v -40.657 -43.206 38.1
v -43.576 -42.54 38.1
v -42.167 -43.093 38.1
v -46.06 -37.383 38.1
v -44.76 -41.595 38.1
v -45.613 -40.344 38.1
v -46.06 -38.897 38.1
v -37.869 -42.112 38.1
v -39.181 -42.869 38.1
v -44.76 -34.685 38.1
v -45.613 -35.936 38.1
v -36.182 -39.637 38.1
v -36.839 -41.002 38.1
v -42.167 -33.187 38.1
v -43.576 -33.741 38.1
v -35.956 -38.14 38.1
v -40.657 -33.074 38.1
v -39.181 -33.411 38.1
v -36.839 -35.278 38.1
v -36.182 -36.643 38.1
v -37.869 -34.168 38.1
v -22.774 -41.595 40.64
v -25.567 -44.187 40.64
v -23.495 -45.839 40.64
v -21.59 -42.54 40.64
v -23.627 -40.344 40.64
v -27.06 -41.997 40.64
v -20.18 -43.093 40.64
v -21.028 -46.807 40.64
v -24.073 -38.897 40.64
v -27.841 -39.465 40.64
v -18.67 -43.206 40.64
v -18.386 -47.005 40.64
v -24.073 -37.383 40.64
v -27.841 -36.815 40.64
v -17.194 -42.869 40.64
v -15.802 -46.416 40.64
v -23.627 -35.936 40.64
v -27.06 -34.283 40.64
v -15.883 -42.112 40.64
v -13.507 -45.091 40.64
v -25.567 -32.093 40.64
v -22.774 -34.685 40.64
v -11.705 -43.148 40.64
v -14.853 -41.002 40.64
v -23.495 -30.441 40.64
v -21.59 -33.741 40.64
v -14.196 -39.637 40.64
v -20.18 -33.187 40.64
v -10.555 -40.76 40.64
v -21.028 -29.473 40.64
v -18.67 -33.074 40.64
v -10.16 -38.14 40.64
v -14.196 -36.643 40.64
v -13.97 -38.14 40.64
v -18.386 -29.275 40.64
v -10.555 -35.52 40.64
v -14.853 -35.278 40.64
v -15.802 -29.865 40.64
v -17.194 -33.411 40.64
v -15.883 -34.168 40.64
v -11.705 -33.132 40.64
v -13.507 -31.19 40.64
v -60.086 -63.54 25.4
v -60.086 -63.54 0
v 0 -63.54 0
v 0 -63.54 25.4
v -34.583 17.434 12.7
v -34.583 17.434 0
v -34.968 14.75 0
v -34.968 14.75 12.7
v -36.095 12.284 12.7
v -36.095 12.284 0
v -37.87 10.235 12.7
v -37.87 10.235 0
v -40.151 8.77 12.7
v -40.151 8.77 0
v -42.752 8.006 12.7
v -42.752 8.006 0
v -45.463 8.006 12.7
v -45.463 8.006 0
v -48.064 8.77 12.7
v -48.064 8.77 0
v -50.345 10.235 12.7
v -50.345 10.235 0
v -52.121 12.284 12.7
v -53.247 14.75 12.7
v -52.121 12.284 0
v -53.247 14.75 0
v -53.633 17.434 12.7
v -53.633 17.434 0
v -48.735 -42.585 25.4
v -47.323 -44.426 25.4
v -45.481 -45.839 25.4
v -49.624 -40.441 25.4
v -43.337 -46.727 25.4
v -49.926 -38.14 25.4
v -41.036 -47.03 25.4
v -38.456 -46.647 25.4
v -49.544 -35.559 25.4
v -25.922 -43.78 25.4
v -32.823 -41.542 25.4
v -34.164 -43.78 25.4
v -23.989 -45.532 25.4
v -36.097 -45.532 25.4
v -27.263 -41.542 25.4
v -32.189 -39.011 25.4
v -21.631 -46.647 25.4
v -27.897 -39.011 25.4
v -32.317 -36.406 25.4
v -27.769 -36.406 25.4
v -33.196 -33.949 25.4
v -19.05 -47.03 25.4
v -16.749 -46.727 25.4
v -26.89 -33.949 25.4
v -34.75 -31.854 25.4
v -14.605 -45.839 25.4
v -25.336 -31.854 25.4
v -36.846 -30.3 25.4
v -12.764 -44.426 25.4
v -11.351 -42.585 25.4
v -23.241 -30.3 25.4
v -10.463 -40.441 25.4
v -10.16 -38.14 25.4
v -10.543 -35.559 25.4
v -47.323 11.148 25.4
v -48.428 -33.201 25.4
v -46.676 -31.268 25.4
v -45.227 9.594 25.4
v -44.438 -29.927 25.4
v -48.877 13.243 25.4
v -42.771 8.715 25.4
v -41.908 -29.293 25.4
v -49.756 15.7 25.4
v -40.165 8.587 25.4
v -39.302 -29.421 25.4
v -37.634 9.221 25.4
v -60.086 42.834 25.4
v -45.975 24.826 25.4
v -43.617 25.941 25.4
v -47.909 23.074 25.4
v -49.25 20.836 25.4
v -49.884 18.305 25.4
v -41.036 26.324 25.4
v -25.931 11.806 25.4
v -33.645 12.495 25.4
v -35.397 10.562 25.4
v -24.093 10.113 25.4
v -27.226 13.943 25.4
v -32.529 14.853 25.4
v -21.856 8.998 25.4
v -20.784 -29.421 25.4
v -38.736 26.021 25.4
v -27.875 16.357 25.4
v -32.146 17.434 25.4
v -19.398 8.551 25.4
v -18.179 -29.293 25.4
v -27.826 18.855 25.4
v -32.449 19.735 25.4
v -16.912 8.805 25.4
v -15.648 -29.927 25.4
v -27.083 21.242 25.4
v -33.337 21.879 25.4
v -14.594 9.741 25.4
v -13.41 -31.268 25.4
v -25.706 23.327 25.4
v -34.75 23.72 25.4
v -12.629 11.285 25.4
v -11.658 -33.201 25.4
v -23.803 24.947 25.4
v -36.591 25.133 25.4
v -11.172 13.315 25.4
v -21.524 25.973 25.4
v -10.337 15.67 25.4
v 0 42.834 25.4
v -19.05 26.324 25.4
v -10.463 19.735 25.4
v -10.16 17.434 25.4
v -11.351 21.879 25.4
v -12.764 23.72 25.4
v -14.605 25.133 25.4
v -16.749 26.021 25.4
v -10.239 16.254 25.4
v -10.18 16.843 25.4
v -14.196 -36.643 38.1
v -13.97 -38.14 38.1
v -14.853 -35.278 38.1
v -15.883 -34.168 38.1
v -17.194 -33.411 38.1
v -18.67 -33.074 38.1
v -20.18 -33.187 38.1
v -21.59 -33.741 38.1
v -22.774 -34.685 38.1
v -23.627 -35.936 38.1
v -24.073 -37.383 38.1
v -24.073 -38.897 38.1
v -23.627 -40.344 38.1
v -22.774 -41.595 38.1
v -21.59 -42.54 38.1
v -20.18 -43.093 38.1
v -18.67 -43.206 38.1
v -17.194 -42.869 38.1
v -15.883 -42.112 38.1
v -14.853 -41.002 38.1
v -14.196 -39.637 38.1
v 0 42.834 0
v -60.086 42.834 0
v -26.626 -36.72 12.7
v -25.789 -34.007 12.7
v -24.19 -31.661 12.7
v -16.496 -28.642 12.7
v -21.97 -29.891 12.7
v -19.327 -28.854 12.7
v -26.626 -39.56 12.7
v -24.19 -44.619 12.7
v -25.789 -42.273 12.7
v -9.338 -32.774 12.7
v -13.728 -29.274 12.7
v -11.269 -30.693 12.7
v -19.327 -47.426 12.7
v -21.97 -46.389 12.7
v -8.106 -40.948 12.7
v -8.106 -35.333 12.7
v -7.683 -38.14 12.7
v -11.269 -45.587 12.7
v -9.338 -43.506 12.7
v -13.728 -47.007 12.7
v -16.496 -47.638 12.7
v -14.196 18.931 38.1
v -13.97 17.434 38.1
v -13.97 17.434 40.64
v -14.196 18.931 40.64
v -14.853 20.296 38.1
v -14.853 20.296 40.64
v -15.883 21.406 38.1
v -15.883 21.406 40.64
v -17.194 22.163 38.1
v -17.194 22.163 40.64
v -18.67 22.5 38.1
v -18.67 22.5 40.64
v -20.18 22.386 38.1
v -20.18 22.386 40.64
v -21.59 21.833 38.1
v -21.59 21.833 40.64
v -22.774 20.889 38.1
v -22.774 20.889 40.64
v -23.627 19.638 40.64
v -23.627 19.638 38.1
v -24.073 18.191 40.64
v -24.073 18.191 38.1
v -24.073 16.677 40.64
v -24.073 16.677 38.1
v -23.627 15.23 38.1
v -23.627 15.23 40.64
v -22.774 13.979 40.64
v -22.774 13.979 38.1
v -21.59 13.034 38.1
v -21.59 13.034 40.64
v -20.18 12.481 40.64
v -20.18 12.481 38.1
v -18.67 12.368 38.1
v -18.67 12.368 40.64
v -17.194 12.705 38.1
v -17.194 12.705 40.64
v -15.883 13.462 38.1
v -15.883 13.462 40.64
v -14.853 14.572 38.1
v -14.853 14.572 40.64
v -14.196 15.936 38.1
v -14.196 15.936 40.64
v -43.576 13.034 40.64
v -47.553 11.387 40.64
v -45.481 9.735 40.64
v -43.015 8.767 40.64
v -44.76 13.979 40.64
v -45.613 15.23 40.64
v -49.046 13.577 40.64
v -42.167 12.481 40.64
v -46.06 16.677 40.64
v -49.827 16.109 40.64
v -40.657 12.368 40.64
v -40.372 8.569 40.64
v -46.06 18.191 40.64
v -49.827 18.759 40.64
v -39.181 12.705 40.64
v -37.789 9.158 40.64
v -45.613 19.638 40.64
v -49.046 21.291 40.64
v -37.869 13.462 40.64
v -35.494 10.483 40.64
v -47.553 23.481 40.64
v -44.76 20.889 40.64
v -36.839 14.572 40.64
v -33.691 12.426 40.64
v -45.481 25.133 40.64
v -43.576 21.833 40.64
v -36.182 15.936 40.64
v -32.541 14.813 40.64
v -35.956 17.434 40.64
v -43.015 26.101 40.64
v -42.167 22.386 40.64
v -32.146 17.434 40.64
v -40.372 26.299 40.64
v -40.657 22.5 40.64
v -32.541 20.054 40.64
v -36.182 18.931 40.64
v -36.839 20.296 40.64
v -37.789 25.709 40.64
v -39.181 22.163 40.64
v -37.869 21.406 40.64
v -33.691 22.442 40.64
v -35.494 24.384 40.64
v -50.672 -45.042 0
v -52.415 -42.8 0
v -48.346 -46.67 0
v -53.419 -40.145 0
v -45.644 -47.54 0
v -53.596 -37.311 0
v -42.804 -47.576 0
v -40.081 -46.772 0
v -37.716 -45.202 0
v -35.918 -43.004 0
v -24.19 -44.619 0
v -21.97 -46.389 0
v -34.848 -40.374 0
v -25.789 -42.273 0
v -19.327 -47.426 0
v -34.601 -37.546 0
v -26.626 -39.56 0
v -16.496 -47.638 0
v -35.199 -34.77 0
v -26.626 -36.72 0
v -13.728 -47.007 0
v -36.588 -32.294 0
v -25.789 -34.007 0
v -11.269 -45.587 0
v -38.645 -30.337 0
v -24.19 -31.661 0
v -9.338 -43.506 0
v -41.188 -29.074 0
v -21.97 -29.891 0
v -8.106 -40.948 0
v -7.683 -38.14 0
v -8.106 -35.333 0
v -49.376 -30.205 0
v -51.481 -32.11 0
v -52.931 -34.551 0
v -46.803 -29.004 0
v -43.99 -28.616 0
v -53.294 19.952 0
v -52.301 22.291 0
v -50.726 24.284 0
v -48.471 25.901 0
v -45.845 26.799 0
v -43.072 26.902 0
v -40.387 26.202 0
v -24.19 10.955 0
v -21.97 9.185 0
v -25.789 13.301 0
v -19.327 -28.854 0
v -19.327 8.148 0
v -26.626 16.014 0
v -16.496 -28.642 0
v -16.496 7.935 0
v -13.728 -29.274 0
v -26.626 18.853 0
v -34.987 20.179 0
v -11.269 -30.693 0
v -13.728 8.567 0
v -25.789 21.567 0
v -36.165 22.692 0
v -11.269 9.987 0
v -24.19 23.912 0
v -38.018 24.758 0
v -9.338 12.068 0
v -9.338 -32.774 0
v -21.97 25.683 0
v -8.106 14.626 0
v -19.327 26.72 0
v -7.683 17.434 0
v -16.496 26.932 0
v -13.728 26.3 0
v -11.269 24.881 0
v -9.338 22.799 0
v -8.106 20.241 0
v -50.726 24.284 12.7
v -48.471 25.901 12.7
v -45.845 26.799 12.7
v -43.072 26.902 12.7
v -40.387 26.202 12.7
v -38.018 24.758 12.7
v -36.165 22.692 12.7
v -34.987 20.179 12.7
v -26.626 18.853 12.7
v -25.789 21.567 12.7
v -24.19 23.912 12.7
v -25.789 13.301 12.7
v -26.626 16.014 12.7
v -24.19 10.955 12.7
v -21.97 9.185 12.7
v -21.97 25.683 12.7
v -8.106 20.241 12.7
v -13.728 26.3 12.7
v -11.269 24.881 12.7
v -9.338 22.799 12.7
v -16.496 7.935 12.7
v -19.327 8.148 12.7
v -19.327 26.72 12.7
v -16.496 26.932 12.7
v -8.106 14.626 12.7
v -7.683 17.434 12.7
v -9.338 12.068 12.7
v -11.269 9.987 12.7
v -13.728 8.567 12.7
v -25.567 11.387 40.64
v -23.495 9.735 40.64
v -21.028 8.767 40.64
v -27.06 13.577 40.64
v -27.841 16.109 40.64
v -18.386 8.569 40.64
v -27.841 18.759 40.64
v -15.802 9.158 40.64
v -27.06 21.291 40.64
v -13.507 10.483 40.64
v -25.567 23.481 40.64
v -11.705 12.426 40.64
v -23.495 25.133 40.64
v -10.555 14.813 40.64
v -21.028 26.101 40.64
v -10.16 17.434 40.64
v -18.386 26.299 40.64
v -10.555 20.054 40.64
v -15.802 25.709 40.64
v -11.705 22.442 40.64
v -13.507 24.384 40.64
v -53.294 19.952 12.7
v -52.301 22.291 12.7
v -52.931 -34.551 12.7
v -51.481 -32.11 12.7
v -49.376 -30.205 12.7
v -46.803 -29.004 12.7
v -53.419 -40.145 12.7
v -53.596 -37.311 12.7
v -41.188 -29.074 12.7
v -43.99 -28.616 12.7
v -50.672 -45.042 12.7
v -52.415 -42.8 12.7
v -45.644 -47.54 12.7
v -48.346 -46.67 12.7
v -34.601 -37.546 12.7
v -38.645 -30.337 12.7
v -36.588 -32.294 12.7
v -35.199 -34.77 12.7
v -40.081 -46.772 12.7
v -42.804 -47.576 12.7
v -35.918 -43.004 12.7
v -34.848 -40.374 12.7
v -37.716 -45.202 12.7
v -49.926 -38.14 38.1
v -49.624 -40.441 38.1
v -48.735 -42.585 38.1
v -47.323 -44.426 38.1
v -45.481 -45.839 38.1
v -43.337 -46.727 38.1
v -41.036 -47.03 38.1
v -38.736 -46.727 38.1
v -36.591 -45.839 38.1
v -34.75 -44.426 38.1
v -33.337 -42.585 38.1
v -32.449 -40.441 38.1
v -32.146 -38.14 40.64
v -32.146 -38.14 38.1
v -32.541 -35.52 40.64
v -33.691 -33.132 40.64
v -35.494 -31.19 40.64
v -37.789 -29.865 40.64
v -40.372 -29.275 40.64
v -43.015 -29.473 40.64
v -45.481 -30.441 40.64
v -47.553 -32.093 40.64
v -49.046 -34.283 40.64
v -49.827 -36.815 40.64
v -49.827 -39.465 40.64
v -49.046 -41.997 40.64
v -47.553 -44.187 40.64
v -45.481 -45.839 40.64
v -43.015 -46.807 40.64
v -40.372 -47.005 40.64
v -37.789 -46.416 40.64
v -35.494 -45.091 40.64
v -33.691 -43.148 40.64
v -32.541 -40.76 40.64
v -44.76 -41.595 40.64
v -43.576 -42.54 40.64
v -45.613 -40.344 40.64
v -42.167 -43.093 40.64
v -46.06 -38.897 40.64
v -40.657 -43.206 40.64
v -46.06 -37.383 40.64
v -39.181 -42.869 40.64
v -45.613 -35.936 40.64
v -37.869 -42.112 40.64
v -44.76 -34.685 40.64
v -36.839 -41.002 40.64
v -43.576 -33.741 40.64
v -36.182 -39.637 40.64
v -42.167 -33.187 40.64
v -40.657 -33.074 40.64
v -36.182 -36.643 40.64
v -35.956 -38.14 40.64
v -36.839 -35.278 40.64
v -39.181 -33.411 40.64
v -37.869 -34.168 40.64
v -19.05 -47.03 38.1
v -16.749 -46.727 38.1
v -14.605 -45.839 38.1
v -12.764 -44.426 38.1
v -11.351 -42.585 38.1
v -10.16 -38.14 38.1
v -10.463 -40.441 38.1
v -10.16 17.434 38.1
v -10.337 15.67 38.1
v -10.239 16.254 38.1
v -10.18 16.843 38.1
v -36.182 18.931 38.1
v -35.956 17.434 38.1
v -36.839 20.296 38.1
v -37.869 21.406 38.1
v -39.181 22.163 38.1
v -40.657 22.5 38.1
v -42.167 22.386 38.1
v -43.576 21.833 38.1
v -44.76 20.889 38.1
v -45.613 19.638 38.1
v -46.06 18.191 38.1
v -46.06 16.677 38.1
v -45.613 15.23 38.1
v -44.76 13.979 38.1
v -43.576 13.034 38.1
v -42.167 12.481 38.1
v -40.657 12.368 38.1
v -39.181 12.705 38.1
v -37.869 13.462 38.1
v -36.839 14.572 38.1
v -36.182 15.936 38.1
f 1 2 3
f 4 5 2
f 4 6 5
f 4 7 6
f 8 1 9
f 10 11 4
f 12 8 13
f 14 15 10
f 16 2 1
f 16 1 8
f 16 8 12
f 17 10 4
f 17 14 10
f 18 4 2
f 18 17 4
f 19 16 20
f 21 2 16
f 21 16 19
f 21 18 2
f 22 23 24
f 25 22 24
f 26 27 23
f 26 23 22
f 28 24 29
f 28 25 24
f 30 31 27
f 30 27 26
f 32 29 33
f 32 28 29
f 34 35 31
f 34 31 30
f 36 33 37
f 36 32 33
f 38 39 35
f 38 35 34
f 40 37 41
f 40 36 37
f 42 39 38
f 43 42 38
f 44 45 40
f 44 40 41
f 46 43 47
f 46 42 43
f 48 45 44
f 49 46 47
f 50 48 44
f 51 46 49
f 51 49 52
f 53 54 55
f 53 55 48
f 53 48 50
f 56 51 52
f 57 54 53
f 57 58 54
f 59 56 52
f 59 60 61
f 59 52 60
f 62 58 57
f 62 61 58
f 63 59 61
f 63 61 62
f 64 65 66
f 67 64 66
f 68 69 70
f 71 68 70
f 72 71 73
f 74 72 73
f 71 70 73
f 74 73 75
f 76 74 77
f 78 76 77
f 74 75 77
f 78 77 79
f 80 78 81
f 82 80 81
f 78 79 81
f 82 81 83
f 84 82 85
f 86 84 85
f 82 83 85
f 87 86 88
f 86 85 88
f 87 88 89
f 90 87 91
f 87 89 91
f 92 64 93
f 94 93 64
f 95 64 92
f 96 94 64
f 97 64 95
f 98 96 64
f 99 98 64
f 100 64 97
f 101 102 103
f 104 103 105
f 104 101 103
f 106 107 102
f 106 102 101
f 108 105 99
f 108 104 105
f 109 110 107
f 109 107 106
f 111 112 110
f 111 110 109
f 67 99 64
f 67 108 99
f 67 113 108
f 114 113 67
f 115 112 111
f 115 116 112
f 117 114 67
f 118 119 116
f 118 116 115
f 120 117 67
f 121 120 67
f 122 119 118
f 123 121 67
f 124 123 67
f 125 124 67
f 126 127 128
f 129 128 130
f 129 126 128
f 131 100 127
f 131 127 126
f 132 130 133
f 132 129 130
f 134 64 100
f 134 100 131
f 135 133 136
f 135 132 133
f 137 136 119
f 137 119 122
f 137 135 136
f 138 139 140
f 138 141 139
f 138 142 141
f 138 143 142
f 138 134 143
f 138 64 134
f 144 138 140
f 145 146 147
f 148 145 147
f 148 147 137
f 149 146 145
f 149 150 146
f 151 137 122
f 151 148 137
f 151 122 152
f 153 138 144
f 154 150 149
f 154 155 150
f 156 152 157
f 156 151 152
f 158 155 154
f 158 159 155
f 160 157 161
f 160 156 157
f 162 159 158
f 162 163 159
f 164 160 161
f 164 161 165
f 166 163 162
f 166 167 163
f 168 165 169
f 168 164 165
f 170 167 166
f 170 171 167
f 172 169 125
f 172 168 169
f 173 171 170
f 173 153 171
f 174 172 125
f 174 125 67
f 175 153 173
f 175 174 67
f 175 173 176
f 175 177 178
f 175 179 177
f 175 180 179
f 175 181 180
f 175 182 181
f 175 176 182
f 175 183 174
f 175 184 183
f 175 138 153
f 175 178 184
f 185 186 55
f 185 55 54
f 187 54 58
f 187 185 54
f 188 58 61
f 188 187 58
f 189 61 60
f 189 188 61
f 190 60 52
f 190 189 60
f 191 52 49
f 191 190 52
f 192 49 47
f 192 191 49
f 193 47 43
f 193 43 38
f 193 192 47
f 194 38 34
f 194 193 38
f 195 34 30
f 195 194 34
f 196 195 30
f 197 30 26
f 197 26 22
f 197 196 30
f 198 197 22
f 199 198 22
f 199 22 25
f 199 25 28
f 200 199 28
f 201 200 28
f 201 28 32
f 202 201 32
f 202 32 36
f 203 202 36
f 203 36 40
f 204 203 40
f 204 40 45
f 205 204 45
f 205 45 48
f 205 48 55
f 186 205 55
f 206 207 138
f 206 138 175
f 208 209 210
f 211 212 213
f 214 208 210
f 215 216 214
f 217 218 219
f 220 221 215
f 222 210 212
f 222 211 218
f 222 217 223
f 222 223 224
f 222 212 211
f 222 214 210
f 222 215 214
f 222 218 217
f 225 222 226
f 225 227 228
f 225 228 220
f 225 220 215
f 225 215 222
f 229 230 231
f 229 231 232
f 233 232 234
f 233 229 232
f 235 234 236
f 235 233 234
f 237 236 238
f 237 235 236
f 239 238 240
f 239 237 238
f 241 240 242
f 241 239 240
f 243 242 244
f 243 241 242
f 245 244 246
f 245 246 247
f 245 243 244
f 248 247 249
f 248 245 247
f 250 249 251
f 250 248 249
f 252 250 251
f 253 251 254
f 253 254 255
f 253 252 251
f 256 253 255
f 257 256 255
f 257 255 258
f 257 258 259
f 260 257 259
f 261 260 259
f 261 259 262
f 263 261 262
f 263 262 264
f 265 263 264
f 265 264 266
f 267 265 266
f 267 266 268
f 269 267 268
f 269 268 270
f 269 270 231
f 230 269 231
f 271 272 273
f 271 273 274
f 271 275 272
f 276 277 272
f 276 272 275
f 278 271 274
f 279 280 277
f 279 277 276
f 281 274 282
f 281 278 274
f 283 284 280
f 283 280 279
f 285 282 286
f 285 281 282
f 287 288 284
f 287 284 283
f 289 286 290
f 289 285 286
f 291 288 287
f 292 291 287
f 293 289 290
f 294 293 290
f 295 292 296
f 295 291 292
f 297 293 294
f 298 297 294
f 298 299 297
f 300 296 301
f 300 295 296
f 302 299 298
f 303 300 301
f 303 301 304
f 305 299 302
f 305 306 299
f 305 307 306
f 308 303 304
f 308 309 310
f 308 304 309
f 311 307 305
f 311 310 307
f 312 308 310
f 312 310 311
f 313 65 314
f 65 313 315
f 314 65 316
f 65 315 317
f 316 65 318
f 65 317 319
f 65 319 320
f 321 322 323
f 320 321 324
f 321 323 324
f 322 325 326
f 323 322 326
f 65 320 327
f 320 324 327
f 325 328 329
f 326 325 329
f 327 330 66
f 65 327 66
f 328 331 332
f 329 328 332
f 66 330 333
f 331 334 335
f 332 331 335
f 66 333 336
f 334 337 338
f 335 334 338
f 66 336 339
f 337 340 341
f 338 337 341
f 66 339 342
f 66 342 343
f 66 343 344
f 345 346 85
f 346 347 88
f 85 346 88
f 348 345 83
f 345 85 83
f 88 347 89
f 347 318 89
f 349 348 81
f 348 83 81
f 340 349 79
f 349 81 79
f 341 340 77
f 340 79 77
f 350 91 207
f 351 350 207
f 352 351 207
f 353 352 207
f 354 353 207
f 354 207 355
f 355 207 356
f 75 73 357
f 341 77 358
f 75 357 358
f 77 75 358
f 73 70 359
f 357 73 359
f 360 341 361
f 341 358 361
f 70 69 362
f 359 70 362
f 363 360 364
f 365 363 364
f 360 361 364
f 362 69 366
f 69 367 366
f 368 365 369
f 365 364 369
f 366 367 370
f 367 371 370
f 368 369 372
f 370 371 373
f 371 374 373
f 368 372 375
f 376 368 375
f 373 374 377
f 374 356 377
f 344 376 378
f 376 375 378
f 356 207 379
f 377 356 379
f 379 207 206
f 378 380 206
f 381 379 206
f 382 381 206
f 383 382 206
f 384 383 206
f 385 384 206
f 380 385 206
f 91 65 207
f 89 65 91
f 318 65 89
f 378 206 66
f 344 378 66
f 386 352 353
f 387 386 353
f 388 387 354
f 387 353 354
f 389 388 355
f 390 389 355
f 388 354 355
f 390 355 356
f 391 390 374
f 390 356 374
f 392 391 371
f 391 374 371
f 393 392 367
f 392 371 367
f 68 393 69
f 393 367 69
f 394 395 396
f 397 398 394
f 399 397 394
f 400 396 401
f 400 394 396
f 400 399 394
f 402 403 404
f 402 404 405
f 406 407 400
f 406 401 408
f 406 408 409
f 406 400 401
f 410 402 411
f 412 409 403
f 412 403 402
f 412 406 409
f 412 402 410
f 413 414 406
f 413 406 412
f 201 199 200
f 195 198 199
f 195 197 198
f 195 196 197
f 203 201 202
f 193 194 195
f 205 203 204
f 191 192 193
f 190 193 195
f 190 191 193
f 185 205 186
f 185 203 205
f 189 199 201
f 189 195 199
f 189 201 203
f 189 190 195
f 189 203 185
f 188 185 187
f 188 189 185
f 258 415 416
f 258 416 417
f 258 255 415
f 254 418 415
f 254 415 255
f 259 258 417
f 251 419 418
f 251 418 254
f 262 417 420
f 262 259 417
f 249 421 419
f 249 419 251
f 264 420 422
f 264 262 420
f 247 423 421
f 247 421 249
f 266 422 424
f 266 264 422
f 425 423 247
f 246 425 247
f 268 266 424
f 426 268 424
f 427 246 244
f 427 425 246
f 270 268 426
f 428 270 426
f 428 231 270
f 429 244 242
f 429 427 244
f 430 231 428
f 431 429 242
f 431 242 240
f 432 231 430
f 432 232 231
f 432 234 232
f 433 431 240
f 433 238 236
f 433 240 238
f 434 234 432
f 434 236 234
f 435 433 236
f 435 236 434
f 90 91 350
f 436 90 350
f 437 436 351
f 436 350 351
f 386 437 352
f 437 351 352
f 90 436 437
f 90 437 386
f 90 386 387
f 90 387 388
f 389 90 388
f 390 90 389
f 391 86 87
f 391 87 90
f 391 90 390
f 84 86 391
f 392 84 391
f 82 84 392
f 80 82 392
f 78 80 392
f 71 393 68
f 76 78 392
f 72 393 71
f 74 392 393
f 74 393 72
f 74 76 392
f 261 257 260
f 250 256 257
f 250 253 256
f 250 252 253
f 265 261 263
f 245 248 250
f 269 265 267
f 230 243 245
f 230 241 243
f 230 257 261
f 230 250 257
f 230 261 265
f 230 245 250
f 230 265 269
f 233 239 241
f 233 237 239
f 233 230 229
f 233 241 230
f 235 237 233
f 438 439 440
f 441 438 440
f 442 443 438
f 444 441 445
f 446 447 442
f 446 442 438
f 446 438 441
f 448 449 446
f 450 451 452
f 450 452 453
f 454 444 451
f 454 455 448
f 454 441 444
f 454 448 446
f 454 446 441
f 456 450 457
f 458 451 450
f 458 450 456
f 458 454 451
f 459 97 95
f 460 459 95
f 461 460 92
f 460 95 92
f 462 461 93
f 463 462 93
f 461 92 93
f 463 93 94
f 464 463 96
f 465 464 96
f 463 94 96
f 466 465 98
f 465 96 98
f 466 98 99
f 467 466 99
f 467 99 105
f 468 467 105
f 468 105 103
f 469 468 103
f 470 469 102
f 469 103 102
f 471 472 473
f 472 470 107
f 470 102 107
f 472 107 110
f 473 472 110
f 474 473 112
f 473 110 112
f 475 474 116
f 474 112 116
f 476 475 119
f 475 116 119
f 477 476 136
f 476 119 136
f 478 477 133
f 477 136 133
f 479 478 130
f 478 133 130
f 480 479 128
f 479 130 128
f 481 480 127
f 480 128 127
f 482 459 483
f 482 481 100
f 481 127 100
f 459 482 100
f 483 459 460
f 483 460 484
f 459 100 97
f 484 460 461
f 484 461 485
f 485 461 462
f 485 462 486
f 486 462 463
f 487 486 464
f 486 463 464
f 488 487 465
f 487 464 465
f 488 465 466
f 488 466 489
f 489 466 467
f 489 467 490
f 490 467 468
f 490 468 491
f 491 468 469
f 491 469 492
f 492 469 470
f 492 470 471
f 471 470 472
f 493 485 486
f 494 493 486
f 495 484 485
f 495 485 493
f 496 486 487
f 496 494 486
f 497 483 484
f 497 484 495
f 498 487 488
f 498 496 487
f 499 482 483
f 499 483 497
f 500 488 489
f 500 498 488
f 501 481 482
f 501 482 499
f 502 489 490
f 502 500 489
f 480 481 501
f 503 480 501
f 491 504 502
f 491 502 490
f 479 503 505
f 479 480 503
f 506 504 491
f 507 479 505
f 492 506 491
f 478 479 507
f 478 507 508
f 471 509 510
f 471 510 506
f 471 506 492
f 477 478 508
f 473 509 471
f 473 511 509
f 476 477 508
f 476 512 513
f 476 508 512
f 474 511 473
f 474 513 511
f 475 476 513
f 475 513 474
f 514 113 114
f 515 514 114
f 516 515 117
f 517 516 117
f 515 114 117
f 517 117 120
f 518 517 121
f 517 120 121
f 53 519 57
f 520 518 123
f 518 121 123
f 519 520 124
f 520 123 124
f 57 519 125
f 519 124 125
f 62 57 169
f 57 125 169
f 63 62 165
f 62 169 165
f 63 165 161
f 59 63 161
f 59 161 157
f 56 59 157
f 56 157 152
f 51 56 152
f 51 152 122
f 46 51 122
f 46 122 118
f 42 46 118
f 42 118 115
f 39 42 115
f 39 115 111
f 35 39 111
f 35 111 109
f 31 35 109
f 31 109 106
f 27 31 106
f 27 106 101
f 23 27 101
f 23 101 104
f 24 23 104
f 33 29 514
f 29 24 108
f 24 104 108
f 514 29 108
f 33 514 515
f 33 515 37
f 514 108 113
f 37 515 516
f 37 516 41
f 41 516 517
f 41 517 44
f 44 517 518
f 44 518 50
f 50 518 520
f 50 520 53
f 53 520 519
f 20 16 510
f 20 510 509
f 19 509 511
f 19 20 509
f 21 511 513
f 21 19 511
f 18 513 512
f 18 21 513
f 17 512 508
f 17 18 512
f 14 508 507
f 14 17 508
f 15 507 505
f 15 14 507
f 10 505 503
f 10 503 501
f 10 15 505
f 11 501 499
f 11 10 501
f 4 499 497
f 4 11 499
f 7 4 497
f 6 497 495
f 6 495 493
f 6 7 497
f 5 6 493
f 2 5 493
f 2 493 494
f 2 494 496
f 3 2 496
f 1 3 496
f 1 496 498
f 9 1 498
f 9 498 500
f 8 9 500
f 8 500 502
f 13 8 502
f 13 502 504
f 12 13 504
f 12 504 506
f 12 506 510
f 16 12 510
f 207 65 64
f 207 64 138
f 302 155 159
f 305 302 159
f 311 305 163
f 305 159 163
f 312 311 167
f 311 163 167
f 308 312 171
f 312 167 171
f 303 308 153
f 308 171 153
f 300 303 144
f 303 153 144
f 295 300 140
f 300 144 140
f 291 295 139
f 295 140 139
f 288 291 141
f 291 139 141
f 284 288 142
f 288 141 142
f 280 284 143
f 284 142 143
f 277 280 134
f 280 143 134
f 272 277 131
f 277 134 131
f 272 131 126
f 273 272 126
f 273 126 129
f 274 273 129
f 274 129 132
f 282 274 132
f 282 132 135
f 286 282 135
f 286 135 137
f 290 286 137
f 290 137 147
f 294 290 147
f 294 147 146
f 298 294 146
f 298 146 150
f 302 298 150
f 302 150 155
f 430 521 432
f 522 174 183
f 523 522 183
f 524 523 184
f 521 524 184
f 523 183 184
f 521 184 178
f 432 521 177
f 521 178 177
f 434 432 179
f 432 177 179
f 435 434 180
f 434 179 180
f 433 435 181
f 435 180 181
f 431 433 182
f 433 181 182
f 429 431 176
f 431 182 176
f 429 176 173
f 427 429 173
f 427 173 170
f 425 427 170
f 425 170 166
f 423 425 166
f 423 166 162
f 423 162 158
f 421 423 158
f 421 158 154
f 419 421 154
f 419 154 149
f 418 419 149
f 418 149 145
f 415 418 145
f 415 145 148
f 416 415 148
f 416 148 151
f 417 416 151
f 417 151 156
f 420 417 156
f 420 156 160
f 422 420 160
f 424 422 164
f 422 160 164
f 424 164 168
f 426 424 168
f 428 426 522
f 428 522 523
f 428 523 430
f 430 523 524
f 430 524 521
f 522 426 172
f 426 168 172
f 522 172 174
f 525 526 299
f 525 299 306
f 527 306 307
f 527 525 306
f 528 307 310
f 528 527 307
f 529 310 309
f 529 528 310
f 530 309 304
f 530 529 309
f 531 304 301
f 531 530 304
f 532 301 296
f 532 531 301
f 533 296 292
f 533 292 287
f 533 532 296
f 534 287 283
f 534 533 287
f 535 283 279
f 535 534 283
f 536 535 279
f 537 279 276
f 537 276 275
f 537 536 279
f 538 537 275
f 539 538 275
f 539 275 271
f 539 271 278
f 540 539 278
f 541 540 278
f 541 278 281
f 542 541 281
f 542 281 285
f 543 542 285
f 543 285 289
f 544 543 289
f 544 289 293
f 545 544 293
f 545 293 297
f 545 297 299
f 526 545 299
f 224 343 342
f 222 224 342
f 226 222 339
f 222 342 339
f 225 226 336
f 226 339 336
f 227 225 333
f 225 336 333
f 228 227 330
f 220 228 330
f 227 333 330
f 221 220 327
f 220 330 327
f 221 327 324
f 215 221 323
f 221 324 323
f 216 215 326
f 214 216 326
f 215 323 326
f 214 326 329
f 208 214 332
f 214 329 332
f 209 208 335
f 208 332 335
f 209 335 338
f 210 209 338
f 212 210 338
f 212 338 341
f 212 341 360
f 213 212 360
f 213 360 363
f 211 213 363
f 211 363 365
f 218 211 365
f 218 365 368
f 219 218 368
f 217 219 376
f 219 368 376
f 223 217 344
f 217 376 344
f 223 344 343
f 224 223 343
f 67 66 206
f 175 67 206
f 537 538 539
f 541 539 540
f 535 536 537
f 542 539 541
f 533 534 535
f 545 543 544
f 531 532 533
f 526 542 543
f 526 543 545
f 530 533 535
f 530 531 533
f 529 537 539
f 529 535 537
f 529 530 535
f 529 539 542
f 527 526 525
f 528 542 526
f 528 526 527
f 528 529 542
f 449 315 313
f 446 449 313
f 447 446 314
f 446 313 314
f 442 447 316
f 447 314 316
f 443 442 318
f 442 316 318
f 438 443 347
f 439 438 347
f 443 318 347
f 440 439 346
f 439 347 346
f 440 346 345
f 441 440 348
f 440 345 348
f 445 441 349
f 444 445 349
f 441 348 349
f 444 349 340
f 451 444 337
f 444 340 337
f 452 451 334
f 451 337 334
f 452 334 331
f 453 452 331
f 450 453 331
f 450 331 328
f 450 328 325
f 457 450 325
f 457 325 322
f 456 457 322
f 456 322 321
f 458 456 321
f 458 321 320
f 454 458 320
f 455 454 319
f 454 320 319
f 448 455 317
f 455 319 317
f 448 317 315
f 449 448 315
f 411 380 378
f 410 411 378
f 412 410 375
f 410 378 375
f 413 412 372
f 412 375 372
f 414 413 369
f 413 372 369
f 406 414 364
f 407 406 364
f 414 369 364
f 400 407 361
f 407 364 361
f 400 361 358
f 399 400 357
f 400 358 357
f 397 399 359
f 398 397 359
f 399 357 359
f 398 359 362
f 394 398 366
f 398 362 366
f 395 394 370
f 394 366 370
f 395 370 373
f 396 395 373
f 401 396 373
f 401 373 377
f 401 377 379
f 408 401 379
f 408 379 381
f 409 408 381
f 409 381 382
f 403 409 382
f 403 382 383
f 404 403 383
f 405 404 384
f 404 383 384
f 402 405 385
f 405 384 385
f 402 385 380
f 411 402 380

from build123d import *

# Parameters (mm, degrees)
F0_W     = 60.086440295
F0_H     = 106.3739694655
F1_DEPTH = 25.4
F3_DEPTH = 12.7
F4_R     = 8.89
F4_R_2   = 5.08
F5_DEPTH = 15.24
F7_DEPTH = 12.7


with BuildPart() as f1:
    # F0 (on Top) → F1 (new body)
    with BuildSketch(Plane.XY):
        with Locations((-30.0432201475, -10.3531312197)):
            Rectangle(F0_W, F0_H)
    extrude(amount=F1_DEPTH)

    # F2 (on face) → F3 (join)
    with BuildSketch(Plane.XY.offset(25.4)):
        with BuildLine():
            ThreePointArc((-10.16, -38.1401159525), (-25.3361792847, -31.8539366677), (-19.05, -47.0301159525))
            Line((-19.05, -47.0301159525), (-19.05, -38.1401159525))
            Line((-19.05, -38.1401159525), (-10.16, -38.1401159525))
        make_face()
        with BuildLine():
            Line((-19.05, -38.1401159525), (-19.05, -47.0301159525))
            ThreePointArc((-19.05, -47.0301159525), (-12.7638207153, -44.4262952372), (-10.16, -38.1401159525))
            Line((-10.16, -38.1401159525), (-19.05, -38.1401159525))
        make_face()
        with BuildLine():
            ThreePointArc((-49.926440295, -38.1401159525), (-47.3226195797, -44.4262952372), (-41.036440295, -47.0301159525))
            Line((-41.036440295, -47.0301159525), (-41.036440295, -38.1401159525))
            Line((-41.036440295, -38.1401159525), (-49.926440295, -38.1401159525))
        make_face()
        with BuildLine():
            Line((-41.036440295, -38.1401159525), (-41.036440295, -47.0301159525))
            ThreePointArc((-41.036440295, -47.0301159525), (-34.7502610102, -44.4262952372), (-32.146440295, -38.1401159525))
            ThreePointArc((-32.146440295, -38.1401159525), (-41.036440295, -29.2501159525), (-49.926440295, -38.1401159525))
            Line((-49.926440295, -38.1401159525), (-41.036440295, -38.1401159525))
        make_face()
        with BuildLine():
            ThreePointArc((-41.036440295, 26.323853513), (-47.3226195797, 23.7200327978), (-49.926440295, 17.433853513))
            Line((-49.926440295, 17.433853513), (-41.036440295, 17.433853513))
            Line((-41.036440295, 17.433853513), (-41.036440295, 26.323853513))
        make_face()
        with BuildLine():
            Line((-41.036440295, 17.433853513), (-49.926440295, 17.433853513))
            ThreePointArc((-49.926440295, 17.433853513), (-41.036440295, 8.543853513), (-32.146440295, 17.433853513))
            ThreePointArc((-32.146440295, 17.433853513), (-34.7502610102, 23.7200327978), (-41.036440295, 26.323853513))
            Line((-41.036440295, 26.323853513), (-41.036440295, 17.433853513))
        make_face()
        with BuildLine():
            ThreePointArc((-19.05, 26.323853513), (-25.9314853388, 11.8055980522), (-10.3366687432, 15.6703460962))
            ThreePointArc((-10.3366687432, 15.6703460962), (-10.2042774497, 16.5476861679), (-10.16, 17.433853513))
            ThreePointArc((-10.16, 17.433853513), (-12.7638207153, 23.7200327978), (-19.05, 26.323853513))
        make_face()
    extrude(amount=F3_DEPTH)

    # F4 (on face) → F5 (join)
    with BuildSketch(Plane.XY.offset(25.4)):
        with Locations((-41.036440295, -38.1401159525)):
            Circle(F4_R)
        with Locations((-41.036440295, -38.1401159525)):
            Circle(F4_R_2, mode=Mode.SUBTRACT)
        with Locations((-19.05, -38.1401159525)):
            Circle(F4_R)
        with Locations((-19.05, -38.1401159525)):
            Circle(F4_R_2, mode=Mode.SUBTRACT)
        with Locations((-41.036440295, 17.433853513)):
            Circle(F4_R)
        with Locations((-41.036440295, 17.433853513)):
            Circle(F4_R_2, mode=Mode.SUBTRACT)
        with Locations((-19.05, 17.433853513)):
            Circle(F4_R)
        with Locations((-19.05, 17.433853513)):
            Circle(F4_R_2, mode=Mode.SUBTRACT)
    extrude(amount=F5_DEPTH)

    # F6 (on face) → F7 (cut)
    with BuildSketch(Plane(origin=(0, 0, 0), x_dir=(1, 0, 0), z_dir=(0, 0, -1))):
        with BuildLine():
            Line((-53.6326494753, 38.1401159525), (-48.3460910618, 38.1401159525))
            Line((-48.3460910618, 38.1401159525), (-48.3460910618, 46.6701357601))
            ThreePointArc((-48.3460910618, 46.6701357601), (-52.20384553, 43.1578080957), (-53.6326494753, 38.1401159525))
        make_face()
        with BuildLine():
            Line((-34.5826494753, 38.1401159525), (-48.3460910618, 38.1401159525))
            Line((-48.3460910618, 38.1401159525), (-53.6326494753, 38.1401159525))
            ThreePointArc((-53.6326494753, 38.1401159525), (-44.1076494753, 28.6151159525), (-34.5826494753, 38.1401159525))
        make_face()
        with BuildLine():
            Line((-48.3460910618, 46.6701357601), (-48.3460910618, 38.1401159525))
            Line((-48.3460910618, 38.1401159525), (-34.5826494753, 38.1401159525))
            ThreePointArc((-34.5826494753, 38.1401159525), (-39.0899573321, 46.2363120072), (-48.3460910618, 46.6701357601))
        make_face()
        with BuildLine():
            Line((-7.6825144947, 38.1401159525), (-26.7325144947, 38.1401159525))
            ThreePointArc((-26.7325144947, 38.1401159525), (-17.2075144947, 28.6151159525), (-7.6825144947, 38.1401159525))
        make_face()
        with BuildLine():
            ThreePointArc((-7.6825144947, 38.1401159525), (-17.2075144947, 47.6651159525), (-26.7325144947, 38.1401159525))
            Line((-26.7325144947, 38.1401159525), (-7.6825144947, 38.1401159525))
        make_face()
        with BuildLine():
            ThreePointArc((-26.7325144947, -17.433853513), (-17.2075144947, -26.958853513), (-7.6825144947, -17.433853513))
            Line((-7.6825144947, -17.433853513), (-26.7325144947, -17.433853513))
        make_face()
        with BuildLine():
            Line((-26.7325144947, -17.433853513), (-7.6825144947, -17.433853513))
            ThreePointArc((-7.6825144947, -17.433853513), (-17.2075144947, -7.908853513), (-26.7325144947, -17.433853513))
        make_face()
        with BuildLine():
            Line((-34.5826494753, -17.433853513), (-50.7258884609, -17.433853513))
            Line((-50.7258884609, -17.433853513), (-50.7258884609, -24.2840022508))
            ThreePointArc((-50.7258884609, -24.2840022508), (-40.3869708637, -26.2021016658), (-34.5826494753, -17.433853513))
        make_face()
        with BuildLine():
            Line((-50.7258884609, -17.433853513), (-53.6326494753, -17.433853513))
            ThreePointArc((-53.6326494753, -17.433853513), (-52.8758976281, -21.1545321247), (-50.7258884609, -24.2840022508))
            Line((-50.7258884609, -24.2840022508), (-50.7258884609, -17.433853513))
        make_face()
        with BuildLine():
            ThreePointArc((-34.5826494753, -17.433853513), (-44.1076494753, -7.908853513), (-53.6326494753, -17.433853513))
            Line((-53.6326494753, -17.433853513), (-50.7258884609, -17.433853513))
            Line((-50.7258884609, -17.433853513), (-34.5826494753, -17.433853513))
        make_face()
    extrude(amount=-F7_DEPTH, mode=Mode.SUBTRACT)


solid = f1.part
